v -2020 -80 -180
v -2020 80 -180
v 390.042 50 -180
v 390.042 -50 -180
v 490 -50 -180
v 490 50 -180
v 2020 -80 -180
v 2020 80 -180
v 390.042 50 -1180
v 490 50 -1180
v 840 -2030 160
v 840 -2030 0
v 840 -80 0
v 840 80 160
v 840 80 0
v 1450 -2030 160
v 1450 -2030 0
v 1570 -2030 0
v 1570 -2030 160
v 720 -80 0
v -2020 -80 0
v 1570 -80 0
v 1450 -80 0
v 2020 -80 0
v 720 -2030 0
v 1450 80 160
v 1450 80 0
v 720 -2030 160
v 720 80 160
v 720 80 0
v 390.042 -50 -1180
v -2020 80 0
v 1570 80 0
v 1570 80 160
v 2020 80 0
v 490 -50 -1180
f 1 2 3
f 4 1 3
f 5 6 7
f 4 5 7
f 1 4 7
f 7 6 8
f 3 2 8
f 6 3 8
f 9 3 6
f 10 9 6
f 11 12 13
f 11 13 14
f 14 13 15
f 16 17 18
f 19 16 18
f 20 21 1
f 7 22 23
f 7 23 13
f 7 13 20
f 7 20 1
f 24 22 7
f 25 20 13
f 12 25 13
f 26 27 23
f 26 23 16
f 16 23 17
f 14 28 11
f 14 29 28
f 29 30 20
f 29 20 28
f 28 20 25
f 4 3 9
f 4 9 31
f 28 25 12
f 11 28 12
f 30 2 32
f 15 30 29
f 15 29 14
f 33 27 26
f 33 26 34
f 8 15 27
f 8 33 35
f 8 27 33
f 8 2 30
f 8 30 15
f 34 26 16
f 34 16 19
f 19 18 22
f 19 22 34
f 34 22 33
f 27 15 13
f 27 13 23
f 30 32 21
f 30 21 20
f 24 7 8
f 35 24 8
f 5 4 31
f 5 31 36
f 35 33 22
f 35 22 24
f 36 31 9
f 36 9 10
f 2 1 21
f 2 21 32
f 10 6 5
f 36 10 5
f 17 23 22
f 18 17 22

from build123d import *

# Parameters (mm, degrees)
F0_W     = 2740
F0_H     = 160
F0_W_2   = 120
F0_W_3   = 610
F0_W_4   = 450
F1_DEPTH = 180
F0_H_2   = 1950
F2_DEPTH = 160
F3_W     = 99.9577641487
F3_H     = 100
F4_DEPTH = 1000


with BuildPart() as f1:
    # F0 (on Top) → F1 (new body)
    with BuildSketch(Plane.XY):
        with Locations((-650, 0)):
            Rectangle(F0_W, F0_H)
        with Locations((780, 0)):
            Rectangle(F0_W_2, F0_H)
        with Locations((1145, 0)):
            Rectangle(F0_W_3, F0_H)
        with Locations((1510, 0)):
            Rectangle(F0_W_2, F0_H)
        with Locations((1795, 0)):
            Rectangle(F0_W_4, F0_H)
    extrude(amount=-F1_DEPTH)

    # F0 (on Top) → F2 (join)
    with BuildSketch(Plane.XY):
        with Locations((780, -1055)):
            Rectangle(F0_W_2, F0_H_2)
        with Locations((780, 0)):
            Rectangle(F0_W_2, F0_H)
        with Locations((1510, 0)):
            Rectangle(F0_W_2, F0_H)
        with Locations((1510, -1055)):
            Rectangle(F0_W_2, F0_H_2)
    extrude(amount=F2_DEPTH)

    # F3 (on face) → F4 (join)
    with BuildSketch(Plane(origin=(0, 0, -180), x_dir=(1, 0, 0), z_dir=(0, 0, -1))):
        with Locations((440.0211179256, 0)):
            Rectangle(F3_W, F3_H)
    extrude(amount=F4_DEPTH)


solid = f1.part
